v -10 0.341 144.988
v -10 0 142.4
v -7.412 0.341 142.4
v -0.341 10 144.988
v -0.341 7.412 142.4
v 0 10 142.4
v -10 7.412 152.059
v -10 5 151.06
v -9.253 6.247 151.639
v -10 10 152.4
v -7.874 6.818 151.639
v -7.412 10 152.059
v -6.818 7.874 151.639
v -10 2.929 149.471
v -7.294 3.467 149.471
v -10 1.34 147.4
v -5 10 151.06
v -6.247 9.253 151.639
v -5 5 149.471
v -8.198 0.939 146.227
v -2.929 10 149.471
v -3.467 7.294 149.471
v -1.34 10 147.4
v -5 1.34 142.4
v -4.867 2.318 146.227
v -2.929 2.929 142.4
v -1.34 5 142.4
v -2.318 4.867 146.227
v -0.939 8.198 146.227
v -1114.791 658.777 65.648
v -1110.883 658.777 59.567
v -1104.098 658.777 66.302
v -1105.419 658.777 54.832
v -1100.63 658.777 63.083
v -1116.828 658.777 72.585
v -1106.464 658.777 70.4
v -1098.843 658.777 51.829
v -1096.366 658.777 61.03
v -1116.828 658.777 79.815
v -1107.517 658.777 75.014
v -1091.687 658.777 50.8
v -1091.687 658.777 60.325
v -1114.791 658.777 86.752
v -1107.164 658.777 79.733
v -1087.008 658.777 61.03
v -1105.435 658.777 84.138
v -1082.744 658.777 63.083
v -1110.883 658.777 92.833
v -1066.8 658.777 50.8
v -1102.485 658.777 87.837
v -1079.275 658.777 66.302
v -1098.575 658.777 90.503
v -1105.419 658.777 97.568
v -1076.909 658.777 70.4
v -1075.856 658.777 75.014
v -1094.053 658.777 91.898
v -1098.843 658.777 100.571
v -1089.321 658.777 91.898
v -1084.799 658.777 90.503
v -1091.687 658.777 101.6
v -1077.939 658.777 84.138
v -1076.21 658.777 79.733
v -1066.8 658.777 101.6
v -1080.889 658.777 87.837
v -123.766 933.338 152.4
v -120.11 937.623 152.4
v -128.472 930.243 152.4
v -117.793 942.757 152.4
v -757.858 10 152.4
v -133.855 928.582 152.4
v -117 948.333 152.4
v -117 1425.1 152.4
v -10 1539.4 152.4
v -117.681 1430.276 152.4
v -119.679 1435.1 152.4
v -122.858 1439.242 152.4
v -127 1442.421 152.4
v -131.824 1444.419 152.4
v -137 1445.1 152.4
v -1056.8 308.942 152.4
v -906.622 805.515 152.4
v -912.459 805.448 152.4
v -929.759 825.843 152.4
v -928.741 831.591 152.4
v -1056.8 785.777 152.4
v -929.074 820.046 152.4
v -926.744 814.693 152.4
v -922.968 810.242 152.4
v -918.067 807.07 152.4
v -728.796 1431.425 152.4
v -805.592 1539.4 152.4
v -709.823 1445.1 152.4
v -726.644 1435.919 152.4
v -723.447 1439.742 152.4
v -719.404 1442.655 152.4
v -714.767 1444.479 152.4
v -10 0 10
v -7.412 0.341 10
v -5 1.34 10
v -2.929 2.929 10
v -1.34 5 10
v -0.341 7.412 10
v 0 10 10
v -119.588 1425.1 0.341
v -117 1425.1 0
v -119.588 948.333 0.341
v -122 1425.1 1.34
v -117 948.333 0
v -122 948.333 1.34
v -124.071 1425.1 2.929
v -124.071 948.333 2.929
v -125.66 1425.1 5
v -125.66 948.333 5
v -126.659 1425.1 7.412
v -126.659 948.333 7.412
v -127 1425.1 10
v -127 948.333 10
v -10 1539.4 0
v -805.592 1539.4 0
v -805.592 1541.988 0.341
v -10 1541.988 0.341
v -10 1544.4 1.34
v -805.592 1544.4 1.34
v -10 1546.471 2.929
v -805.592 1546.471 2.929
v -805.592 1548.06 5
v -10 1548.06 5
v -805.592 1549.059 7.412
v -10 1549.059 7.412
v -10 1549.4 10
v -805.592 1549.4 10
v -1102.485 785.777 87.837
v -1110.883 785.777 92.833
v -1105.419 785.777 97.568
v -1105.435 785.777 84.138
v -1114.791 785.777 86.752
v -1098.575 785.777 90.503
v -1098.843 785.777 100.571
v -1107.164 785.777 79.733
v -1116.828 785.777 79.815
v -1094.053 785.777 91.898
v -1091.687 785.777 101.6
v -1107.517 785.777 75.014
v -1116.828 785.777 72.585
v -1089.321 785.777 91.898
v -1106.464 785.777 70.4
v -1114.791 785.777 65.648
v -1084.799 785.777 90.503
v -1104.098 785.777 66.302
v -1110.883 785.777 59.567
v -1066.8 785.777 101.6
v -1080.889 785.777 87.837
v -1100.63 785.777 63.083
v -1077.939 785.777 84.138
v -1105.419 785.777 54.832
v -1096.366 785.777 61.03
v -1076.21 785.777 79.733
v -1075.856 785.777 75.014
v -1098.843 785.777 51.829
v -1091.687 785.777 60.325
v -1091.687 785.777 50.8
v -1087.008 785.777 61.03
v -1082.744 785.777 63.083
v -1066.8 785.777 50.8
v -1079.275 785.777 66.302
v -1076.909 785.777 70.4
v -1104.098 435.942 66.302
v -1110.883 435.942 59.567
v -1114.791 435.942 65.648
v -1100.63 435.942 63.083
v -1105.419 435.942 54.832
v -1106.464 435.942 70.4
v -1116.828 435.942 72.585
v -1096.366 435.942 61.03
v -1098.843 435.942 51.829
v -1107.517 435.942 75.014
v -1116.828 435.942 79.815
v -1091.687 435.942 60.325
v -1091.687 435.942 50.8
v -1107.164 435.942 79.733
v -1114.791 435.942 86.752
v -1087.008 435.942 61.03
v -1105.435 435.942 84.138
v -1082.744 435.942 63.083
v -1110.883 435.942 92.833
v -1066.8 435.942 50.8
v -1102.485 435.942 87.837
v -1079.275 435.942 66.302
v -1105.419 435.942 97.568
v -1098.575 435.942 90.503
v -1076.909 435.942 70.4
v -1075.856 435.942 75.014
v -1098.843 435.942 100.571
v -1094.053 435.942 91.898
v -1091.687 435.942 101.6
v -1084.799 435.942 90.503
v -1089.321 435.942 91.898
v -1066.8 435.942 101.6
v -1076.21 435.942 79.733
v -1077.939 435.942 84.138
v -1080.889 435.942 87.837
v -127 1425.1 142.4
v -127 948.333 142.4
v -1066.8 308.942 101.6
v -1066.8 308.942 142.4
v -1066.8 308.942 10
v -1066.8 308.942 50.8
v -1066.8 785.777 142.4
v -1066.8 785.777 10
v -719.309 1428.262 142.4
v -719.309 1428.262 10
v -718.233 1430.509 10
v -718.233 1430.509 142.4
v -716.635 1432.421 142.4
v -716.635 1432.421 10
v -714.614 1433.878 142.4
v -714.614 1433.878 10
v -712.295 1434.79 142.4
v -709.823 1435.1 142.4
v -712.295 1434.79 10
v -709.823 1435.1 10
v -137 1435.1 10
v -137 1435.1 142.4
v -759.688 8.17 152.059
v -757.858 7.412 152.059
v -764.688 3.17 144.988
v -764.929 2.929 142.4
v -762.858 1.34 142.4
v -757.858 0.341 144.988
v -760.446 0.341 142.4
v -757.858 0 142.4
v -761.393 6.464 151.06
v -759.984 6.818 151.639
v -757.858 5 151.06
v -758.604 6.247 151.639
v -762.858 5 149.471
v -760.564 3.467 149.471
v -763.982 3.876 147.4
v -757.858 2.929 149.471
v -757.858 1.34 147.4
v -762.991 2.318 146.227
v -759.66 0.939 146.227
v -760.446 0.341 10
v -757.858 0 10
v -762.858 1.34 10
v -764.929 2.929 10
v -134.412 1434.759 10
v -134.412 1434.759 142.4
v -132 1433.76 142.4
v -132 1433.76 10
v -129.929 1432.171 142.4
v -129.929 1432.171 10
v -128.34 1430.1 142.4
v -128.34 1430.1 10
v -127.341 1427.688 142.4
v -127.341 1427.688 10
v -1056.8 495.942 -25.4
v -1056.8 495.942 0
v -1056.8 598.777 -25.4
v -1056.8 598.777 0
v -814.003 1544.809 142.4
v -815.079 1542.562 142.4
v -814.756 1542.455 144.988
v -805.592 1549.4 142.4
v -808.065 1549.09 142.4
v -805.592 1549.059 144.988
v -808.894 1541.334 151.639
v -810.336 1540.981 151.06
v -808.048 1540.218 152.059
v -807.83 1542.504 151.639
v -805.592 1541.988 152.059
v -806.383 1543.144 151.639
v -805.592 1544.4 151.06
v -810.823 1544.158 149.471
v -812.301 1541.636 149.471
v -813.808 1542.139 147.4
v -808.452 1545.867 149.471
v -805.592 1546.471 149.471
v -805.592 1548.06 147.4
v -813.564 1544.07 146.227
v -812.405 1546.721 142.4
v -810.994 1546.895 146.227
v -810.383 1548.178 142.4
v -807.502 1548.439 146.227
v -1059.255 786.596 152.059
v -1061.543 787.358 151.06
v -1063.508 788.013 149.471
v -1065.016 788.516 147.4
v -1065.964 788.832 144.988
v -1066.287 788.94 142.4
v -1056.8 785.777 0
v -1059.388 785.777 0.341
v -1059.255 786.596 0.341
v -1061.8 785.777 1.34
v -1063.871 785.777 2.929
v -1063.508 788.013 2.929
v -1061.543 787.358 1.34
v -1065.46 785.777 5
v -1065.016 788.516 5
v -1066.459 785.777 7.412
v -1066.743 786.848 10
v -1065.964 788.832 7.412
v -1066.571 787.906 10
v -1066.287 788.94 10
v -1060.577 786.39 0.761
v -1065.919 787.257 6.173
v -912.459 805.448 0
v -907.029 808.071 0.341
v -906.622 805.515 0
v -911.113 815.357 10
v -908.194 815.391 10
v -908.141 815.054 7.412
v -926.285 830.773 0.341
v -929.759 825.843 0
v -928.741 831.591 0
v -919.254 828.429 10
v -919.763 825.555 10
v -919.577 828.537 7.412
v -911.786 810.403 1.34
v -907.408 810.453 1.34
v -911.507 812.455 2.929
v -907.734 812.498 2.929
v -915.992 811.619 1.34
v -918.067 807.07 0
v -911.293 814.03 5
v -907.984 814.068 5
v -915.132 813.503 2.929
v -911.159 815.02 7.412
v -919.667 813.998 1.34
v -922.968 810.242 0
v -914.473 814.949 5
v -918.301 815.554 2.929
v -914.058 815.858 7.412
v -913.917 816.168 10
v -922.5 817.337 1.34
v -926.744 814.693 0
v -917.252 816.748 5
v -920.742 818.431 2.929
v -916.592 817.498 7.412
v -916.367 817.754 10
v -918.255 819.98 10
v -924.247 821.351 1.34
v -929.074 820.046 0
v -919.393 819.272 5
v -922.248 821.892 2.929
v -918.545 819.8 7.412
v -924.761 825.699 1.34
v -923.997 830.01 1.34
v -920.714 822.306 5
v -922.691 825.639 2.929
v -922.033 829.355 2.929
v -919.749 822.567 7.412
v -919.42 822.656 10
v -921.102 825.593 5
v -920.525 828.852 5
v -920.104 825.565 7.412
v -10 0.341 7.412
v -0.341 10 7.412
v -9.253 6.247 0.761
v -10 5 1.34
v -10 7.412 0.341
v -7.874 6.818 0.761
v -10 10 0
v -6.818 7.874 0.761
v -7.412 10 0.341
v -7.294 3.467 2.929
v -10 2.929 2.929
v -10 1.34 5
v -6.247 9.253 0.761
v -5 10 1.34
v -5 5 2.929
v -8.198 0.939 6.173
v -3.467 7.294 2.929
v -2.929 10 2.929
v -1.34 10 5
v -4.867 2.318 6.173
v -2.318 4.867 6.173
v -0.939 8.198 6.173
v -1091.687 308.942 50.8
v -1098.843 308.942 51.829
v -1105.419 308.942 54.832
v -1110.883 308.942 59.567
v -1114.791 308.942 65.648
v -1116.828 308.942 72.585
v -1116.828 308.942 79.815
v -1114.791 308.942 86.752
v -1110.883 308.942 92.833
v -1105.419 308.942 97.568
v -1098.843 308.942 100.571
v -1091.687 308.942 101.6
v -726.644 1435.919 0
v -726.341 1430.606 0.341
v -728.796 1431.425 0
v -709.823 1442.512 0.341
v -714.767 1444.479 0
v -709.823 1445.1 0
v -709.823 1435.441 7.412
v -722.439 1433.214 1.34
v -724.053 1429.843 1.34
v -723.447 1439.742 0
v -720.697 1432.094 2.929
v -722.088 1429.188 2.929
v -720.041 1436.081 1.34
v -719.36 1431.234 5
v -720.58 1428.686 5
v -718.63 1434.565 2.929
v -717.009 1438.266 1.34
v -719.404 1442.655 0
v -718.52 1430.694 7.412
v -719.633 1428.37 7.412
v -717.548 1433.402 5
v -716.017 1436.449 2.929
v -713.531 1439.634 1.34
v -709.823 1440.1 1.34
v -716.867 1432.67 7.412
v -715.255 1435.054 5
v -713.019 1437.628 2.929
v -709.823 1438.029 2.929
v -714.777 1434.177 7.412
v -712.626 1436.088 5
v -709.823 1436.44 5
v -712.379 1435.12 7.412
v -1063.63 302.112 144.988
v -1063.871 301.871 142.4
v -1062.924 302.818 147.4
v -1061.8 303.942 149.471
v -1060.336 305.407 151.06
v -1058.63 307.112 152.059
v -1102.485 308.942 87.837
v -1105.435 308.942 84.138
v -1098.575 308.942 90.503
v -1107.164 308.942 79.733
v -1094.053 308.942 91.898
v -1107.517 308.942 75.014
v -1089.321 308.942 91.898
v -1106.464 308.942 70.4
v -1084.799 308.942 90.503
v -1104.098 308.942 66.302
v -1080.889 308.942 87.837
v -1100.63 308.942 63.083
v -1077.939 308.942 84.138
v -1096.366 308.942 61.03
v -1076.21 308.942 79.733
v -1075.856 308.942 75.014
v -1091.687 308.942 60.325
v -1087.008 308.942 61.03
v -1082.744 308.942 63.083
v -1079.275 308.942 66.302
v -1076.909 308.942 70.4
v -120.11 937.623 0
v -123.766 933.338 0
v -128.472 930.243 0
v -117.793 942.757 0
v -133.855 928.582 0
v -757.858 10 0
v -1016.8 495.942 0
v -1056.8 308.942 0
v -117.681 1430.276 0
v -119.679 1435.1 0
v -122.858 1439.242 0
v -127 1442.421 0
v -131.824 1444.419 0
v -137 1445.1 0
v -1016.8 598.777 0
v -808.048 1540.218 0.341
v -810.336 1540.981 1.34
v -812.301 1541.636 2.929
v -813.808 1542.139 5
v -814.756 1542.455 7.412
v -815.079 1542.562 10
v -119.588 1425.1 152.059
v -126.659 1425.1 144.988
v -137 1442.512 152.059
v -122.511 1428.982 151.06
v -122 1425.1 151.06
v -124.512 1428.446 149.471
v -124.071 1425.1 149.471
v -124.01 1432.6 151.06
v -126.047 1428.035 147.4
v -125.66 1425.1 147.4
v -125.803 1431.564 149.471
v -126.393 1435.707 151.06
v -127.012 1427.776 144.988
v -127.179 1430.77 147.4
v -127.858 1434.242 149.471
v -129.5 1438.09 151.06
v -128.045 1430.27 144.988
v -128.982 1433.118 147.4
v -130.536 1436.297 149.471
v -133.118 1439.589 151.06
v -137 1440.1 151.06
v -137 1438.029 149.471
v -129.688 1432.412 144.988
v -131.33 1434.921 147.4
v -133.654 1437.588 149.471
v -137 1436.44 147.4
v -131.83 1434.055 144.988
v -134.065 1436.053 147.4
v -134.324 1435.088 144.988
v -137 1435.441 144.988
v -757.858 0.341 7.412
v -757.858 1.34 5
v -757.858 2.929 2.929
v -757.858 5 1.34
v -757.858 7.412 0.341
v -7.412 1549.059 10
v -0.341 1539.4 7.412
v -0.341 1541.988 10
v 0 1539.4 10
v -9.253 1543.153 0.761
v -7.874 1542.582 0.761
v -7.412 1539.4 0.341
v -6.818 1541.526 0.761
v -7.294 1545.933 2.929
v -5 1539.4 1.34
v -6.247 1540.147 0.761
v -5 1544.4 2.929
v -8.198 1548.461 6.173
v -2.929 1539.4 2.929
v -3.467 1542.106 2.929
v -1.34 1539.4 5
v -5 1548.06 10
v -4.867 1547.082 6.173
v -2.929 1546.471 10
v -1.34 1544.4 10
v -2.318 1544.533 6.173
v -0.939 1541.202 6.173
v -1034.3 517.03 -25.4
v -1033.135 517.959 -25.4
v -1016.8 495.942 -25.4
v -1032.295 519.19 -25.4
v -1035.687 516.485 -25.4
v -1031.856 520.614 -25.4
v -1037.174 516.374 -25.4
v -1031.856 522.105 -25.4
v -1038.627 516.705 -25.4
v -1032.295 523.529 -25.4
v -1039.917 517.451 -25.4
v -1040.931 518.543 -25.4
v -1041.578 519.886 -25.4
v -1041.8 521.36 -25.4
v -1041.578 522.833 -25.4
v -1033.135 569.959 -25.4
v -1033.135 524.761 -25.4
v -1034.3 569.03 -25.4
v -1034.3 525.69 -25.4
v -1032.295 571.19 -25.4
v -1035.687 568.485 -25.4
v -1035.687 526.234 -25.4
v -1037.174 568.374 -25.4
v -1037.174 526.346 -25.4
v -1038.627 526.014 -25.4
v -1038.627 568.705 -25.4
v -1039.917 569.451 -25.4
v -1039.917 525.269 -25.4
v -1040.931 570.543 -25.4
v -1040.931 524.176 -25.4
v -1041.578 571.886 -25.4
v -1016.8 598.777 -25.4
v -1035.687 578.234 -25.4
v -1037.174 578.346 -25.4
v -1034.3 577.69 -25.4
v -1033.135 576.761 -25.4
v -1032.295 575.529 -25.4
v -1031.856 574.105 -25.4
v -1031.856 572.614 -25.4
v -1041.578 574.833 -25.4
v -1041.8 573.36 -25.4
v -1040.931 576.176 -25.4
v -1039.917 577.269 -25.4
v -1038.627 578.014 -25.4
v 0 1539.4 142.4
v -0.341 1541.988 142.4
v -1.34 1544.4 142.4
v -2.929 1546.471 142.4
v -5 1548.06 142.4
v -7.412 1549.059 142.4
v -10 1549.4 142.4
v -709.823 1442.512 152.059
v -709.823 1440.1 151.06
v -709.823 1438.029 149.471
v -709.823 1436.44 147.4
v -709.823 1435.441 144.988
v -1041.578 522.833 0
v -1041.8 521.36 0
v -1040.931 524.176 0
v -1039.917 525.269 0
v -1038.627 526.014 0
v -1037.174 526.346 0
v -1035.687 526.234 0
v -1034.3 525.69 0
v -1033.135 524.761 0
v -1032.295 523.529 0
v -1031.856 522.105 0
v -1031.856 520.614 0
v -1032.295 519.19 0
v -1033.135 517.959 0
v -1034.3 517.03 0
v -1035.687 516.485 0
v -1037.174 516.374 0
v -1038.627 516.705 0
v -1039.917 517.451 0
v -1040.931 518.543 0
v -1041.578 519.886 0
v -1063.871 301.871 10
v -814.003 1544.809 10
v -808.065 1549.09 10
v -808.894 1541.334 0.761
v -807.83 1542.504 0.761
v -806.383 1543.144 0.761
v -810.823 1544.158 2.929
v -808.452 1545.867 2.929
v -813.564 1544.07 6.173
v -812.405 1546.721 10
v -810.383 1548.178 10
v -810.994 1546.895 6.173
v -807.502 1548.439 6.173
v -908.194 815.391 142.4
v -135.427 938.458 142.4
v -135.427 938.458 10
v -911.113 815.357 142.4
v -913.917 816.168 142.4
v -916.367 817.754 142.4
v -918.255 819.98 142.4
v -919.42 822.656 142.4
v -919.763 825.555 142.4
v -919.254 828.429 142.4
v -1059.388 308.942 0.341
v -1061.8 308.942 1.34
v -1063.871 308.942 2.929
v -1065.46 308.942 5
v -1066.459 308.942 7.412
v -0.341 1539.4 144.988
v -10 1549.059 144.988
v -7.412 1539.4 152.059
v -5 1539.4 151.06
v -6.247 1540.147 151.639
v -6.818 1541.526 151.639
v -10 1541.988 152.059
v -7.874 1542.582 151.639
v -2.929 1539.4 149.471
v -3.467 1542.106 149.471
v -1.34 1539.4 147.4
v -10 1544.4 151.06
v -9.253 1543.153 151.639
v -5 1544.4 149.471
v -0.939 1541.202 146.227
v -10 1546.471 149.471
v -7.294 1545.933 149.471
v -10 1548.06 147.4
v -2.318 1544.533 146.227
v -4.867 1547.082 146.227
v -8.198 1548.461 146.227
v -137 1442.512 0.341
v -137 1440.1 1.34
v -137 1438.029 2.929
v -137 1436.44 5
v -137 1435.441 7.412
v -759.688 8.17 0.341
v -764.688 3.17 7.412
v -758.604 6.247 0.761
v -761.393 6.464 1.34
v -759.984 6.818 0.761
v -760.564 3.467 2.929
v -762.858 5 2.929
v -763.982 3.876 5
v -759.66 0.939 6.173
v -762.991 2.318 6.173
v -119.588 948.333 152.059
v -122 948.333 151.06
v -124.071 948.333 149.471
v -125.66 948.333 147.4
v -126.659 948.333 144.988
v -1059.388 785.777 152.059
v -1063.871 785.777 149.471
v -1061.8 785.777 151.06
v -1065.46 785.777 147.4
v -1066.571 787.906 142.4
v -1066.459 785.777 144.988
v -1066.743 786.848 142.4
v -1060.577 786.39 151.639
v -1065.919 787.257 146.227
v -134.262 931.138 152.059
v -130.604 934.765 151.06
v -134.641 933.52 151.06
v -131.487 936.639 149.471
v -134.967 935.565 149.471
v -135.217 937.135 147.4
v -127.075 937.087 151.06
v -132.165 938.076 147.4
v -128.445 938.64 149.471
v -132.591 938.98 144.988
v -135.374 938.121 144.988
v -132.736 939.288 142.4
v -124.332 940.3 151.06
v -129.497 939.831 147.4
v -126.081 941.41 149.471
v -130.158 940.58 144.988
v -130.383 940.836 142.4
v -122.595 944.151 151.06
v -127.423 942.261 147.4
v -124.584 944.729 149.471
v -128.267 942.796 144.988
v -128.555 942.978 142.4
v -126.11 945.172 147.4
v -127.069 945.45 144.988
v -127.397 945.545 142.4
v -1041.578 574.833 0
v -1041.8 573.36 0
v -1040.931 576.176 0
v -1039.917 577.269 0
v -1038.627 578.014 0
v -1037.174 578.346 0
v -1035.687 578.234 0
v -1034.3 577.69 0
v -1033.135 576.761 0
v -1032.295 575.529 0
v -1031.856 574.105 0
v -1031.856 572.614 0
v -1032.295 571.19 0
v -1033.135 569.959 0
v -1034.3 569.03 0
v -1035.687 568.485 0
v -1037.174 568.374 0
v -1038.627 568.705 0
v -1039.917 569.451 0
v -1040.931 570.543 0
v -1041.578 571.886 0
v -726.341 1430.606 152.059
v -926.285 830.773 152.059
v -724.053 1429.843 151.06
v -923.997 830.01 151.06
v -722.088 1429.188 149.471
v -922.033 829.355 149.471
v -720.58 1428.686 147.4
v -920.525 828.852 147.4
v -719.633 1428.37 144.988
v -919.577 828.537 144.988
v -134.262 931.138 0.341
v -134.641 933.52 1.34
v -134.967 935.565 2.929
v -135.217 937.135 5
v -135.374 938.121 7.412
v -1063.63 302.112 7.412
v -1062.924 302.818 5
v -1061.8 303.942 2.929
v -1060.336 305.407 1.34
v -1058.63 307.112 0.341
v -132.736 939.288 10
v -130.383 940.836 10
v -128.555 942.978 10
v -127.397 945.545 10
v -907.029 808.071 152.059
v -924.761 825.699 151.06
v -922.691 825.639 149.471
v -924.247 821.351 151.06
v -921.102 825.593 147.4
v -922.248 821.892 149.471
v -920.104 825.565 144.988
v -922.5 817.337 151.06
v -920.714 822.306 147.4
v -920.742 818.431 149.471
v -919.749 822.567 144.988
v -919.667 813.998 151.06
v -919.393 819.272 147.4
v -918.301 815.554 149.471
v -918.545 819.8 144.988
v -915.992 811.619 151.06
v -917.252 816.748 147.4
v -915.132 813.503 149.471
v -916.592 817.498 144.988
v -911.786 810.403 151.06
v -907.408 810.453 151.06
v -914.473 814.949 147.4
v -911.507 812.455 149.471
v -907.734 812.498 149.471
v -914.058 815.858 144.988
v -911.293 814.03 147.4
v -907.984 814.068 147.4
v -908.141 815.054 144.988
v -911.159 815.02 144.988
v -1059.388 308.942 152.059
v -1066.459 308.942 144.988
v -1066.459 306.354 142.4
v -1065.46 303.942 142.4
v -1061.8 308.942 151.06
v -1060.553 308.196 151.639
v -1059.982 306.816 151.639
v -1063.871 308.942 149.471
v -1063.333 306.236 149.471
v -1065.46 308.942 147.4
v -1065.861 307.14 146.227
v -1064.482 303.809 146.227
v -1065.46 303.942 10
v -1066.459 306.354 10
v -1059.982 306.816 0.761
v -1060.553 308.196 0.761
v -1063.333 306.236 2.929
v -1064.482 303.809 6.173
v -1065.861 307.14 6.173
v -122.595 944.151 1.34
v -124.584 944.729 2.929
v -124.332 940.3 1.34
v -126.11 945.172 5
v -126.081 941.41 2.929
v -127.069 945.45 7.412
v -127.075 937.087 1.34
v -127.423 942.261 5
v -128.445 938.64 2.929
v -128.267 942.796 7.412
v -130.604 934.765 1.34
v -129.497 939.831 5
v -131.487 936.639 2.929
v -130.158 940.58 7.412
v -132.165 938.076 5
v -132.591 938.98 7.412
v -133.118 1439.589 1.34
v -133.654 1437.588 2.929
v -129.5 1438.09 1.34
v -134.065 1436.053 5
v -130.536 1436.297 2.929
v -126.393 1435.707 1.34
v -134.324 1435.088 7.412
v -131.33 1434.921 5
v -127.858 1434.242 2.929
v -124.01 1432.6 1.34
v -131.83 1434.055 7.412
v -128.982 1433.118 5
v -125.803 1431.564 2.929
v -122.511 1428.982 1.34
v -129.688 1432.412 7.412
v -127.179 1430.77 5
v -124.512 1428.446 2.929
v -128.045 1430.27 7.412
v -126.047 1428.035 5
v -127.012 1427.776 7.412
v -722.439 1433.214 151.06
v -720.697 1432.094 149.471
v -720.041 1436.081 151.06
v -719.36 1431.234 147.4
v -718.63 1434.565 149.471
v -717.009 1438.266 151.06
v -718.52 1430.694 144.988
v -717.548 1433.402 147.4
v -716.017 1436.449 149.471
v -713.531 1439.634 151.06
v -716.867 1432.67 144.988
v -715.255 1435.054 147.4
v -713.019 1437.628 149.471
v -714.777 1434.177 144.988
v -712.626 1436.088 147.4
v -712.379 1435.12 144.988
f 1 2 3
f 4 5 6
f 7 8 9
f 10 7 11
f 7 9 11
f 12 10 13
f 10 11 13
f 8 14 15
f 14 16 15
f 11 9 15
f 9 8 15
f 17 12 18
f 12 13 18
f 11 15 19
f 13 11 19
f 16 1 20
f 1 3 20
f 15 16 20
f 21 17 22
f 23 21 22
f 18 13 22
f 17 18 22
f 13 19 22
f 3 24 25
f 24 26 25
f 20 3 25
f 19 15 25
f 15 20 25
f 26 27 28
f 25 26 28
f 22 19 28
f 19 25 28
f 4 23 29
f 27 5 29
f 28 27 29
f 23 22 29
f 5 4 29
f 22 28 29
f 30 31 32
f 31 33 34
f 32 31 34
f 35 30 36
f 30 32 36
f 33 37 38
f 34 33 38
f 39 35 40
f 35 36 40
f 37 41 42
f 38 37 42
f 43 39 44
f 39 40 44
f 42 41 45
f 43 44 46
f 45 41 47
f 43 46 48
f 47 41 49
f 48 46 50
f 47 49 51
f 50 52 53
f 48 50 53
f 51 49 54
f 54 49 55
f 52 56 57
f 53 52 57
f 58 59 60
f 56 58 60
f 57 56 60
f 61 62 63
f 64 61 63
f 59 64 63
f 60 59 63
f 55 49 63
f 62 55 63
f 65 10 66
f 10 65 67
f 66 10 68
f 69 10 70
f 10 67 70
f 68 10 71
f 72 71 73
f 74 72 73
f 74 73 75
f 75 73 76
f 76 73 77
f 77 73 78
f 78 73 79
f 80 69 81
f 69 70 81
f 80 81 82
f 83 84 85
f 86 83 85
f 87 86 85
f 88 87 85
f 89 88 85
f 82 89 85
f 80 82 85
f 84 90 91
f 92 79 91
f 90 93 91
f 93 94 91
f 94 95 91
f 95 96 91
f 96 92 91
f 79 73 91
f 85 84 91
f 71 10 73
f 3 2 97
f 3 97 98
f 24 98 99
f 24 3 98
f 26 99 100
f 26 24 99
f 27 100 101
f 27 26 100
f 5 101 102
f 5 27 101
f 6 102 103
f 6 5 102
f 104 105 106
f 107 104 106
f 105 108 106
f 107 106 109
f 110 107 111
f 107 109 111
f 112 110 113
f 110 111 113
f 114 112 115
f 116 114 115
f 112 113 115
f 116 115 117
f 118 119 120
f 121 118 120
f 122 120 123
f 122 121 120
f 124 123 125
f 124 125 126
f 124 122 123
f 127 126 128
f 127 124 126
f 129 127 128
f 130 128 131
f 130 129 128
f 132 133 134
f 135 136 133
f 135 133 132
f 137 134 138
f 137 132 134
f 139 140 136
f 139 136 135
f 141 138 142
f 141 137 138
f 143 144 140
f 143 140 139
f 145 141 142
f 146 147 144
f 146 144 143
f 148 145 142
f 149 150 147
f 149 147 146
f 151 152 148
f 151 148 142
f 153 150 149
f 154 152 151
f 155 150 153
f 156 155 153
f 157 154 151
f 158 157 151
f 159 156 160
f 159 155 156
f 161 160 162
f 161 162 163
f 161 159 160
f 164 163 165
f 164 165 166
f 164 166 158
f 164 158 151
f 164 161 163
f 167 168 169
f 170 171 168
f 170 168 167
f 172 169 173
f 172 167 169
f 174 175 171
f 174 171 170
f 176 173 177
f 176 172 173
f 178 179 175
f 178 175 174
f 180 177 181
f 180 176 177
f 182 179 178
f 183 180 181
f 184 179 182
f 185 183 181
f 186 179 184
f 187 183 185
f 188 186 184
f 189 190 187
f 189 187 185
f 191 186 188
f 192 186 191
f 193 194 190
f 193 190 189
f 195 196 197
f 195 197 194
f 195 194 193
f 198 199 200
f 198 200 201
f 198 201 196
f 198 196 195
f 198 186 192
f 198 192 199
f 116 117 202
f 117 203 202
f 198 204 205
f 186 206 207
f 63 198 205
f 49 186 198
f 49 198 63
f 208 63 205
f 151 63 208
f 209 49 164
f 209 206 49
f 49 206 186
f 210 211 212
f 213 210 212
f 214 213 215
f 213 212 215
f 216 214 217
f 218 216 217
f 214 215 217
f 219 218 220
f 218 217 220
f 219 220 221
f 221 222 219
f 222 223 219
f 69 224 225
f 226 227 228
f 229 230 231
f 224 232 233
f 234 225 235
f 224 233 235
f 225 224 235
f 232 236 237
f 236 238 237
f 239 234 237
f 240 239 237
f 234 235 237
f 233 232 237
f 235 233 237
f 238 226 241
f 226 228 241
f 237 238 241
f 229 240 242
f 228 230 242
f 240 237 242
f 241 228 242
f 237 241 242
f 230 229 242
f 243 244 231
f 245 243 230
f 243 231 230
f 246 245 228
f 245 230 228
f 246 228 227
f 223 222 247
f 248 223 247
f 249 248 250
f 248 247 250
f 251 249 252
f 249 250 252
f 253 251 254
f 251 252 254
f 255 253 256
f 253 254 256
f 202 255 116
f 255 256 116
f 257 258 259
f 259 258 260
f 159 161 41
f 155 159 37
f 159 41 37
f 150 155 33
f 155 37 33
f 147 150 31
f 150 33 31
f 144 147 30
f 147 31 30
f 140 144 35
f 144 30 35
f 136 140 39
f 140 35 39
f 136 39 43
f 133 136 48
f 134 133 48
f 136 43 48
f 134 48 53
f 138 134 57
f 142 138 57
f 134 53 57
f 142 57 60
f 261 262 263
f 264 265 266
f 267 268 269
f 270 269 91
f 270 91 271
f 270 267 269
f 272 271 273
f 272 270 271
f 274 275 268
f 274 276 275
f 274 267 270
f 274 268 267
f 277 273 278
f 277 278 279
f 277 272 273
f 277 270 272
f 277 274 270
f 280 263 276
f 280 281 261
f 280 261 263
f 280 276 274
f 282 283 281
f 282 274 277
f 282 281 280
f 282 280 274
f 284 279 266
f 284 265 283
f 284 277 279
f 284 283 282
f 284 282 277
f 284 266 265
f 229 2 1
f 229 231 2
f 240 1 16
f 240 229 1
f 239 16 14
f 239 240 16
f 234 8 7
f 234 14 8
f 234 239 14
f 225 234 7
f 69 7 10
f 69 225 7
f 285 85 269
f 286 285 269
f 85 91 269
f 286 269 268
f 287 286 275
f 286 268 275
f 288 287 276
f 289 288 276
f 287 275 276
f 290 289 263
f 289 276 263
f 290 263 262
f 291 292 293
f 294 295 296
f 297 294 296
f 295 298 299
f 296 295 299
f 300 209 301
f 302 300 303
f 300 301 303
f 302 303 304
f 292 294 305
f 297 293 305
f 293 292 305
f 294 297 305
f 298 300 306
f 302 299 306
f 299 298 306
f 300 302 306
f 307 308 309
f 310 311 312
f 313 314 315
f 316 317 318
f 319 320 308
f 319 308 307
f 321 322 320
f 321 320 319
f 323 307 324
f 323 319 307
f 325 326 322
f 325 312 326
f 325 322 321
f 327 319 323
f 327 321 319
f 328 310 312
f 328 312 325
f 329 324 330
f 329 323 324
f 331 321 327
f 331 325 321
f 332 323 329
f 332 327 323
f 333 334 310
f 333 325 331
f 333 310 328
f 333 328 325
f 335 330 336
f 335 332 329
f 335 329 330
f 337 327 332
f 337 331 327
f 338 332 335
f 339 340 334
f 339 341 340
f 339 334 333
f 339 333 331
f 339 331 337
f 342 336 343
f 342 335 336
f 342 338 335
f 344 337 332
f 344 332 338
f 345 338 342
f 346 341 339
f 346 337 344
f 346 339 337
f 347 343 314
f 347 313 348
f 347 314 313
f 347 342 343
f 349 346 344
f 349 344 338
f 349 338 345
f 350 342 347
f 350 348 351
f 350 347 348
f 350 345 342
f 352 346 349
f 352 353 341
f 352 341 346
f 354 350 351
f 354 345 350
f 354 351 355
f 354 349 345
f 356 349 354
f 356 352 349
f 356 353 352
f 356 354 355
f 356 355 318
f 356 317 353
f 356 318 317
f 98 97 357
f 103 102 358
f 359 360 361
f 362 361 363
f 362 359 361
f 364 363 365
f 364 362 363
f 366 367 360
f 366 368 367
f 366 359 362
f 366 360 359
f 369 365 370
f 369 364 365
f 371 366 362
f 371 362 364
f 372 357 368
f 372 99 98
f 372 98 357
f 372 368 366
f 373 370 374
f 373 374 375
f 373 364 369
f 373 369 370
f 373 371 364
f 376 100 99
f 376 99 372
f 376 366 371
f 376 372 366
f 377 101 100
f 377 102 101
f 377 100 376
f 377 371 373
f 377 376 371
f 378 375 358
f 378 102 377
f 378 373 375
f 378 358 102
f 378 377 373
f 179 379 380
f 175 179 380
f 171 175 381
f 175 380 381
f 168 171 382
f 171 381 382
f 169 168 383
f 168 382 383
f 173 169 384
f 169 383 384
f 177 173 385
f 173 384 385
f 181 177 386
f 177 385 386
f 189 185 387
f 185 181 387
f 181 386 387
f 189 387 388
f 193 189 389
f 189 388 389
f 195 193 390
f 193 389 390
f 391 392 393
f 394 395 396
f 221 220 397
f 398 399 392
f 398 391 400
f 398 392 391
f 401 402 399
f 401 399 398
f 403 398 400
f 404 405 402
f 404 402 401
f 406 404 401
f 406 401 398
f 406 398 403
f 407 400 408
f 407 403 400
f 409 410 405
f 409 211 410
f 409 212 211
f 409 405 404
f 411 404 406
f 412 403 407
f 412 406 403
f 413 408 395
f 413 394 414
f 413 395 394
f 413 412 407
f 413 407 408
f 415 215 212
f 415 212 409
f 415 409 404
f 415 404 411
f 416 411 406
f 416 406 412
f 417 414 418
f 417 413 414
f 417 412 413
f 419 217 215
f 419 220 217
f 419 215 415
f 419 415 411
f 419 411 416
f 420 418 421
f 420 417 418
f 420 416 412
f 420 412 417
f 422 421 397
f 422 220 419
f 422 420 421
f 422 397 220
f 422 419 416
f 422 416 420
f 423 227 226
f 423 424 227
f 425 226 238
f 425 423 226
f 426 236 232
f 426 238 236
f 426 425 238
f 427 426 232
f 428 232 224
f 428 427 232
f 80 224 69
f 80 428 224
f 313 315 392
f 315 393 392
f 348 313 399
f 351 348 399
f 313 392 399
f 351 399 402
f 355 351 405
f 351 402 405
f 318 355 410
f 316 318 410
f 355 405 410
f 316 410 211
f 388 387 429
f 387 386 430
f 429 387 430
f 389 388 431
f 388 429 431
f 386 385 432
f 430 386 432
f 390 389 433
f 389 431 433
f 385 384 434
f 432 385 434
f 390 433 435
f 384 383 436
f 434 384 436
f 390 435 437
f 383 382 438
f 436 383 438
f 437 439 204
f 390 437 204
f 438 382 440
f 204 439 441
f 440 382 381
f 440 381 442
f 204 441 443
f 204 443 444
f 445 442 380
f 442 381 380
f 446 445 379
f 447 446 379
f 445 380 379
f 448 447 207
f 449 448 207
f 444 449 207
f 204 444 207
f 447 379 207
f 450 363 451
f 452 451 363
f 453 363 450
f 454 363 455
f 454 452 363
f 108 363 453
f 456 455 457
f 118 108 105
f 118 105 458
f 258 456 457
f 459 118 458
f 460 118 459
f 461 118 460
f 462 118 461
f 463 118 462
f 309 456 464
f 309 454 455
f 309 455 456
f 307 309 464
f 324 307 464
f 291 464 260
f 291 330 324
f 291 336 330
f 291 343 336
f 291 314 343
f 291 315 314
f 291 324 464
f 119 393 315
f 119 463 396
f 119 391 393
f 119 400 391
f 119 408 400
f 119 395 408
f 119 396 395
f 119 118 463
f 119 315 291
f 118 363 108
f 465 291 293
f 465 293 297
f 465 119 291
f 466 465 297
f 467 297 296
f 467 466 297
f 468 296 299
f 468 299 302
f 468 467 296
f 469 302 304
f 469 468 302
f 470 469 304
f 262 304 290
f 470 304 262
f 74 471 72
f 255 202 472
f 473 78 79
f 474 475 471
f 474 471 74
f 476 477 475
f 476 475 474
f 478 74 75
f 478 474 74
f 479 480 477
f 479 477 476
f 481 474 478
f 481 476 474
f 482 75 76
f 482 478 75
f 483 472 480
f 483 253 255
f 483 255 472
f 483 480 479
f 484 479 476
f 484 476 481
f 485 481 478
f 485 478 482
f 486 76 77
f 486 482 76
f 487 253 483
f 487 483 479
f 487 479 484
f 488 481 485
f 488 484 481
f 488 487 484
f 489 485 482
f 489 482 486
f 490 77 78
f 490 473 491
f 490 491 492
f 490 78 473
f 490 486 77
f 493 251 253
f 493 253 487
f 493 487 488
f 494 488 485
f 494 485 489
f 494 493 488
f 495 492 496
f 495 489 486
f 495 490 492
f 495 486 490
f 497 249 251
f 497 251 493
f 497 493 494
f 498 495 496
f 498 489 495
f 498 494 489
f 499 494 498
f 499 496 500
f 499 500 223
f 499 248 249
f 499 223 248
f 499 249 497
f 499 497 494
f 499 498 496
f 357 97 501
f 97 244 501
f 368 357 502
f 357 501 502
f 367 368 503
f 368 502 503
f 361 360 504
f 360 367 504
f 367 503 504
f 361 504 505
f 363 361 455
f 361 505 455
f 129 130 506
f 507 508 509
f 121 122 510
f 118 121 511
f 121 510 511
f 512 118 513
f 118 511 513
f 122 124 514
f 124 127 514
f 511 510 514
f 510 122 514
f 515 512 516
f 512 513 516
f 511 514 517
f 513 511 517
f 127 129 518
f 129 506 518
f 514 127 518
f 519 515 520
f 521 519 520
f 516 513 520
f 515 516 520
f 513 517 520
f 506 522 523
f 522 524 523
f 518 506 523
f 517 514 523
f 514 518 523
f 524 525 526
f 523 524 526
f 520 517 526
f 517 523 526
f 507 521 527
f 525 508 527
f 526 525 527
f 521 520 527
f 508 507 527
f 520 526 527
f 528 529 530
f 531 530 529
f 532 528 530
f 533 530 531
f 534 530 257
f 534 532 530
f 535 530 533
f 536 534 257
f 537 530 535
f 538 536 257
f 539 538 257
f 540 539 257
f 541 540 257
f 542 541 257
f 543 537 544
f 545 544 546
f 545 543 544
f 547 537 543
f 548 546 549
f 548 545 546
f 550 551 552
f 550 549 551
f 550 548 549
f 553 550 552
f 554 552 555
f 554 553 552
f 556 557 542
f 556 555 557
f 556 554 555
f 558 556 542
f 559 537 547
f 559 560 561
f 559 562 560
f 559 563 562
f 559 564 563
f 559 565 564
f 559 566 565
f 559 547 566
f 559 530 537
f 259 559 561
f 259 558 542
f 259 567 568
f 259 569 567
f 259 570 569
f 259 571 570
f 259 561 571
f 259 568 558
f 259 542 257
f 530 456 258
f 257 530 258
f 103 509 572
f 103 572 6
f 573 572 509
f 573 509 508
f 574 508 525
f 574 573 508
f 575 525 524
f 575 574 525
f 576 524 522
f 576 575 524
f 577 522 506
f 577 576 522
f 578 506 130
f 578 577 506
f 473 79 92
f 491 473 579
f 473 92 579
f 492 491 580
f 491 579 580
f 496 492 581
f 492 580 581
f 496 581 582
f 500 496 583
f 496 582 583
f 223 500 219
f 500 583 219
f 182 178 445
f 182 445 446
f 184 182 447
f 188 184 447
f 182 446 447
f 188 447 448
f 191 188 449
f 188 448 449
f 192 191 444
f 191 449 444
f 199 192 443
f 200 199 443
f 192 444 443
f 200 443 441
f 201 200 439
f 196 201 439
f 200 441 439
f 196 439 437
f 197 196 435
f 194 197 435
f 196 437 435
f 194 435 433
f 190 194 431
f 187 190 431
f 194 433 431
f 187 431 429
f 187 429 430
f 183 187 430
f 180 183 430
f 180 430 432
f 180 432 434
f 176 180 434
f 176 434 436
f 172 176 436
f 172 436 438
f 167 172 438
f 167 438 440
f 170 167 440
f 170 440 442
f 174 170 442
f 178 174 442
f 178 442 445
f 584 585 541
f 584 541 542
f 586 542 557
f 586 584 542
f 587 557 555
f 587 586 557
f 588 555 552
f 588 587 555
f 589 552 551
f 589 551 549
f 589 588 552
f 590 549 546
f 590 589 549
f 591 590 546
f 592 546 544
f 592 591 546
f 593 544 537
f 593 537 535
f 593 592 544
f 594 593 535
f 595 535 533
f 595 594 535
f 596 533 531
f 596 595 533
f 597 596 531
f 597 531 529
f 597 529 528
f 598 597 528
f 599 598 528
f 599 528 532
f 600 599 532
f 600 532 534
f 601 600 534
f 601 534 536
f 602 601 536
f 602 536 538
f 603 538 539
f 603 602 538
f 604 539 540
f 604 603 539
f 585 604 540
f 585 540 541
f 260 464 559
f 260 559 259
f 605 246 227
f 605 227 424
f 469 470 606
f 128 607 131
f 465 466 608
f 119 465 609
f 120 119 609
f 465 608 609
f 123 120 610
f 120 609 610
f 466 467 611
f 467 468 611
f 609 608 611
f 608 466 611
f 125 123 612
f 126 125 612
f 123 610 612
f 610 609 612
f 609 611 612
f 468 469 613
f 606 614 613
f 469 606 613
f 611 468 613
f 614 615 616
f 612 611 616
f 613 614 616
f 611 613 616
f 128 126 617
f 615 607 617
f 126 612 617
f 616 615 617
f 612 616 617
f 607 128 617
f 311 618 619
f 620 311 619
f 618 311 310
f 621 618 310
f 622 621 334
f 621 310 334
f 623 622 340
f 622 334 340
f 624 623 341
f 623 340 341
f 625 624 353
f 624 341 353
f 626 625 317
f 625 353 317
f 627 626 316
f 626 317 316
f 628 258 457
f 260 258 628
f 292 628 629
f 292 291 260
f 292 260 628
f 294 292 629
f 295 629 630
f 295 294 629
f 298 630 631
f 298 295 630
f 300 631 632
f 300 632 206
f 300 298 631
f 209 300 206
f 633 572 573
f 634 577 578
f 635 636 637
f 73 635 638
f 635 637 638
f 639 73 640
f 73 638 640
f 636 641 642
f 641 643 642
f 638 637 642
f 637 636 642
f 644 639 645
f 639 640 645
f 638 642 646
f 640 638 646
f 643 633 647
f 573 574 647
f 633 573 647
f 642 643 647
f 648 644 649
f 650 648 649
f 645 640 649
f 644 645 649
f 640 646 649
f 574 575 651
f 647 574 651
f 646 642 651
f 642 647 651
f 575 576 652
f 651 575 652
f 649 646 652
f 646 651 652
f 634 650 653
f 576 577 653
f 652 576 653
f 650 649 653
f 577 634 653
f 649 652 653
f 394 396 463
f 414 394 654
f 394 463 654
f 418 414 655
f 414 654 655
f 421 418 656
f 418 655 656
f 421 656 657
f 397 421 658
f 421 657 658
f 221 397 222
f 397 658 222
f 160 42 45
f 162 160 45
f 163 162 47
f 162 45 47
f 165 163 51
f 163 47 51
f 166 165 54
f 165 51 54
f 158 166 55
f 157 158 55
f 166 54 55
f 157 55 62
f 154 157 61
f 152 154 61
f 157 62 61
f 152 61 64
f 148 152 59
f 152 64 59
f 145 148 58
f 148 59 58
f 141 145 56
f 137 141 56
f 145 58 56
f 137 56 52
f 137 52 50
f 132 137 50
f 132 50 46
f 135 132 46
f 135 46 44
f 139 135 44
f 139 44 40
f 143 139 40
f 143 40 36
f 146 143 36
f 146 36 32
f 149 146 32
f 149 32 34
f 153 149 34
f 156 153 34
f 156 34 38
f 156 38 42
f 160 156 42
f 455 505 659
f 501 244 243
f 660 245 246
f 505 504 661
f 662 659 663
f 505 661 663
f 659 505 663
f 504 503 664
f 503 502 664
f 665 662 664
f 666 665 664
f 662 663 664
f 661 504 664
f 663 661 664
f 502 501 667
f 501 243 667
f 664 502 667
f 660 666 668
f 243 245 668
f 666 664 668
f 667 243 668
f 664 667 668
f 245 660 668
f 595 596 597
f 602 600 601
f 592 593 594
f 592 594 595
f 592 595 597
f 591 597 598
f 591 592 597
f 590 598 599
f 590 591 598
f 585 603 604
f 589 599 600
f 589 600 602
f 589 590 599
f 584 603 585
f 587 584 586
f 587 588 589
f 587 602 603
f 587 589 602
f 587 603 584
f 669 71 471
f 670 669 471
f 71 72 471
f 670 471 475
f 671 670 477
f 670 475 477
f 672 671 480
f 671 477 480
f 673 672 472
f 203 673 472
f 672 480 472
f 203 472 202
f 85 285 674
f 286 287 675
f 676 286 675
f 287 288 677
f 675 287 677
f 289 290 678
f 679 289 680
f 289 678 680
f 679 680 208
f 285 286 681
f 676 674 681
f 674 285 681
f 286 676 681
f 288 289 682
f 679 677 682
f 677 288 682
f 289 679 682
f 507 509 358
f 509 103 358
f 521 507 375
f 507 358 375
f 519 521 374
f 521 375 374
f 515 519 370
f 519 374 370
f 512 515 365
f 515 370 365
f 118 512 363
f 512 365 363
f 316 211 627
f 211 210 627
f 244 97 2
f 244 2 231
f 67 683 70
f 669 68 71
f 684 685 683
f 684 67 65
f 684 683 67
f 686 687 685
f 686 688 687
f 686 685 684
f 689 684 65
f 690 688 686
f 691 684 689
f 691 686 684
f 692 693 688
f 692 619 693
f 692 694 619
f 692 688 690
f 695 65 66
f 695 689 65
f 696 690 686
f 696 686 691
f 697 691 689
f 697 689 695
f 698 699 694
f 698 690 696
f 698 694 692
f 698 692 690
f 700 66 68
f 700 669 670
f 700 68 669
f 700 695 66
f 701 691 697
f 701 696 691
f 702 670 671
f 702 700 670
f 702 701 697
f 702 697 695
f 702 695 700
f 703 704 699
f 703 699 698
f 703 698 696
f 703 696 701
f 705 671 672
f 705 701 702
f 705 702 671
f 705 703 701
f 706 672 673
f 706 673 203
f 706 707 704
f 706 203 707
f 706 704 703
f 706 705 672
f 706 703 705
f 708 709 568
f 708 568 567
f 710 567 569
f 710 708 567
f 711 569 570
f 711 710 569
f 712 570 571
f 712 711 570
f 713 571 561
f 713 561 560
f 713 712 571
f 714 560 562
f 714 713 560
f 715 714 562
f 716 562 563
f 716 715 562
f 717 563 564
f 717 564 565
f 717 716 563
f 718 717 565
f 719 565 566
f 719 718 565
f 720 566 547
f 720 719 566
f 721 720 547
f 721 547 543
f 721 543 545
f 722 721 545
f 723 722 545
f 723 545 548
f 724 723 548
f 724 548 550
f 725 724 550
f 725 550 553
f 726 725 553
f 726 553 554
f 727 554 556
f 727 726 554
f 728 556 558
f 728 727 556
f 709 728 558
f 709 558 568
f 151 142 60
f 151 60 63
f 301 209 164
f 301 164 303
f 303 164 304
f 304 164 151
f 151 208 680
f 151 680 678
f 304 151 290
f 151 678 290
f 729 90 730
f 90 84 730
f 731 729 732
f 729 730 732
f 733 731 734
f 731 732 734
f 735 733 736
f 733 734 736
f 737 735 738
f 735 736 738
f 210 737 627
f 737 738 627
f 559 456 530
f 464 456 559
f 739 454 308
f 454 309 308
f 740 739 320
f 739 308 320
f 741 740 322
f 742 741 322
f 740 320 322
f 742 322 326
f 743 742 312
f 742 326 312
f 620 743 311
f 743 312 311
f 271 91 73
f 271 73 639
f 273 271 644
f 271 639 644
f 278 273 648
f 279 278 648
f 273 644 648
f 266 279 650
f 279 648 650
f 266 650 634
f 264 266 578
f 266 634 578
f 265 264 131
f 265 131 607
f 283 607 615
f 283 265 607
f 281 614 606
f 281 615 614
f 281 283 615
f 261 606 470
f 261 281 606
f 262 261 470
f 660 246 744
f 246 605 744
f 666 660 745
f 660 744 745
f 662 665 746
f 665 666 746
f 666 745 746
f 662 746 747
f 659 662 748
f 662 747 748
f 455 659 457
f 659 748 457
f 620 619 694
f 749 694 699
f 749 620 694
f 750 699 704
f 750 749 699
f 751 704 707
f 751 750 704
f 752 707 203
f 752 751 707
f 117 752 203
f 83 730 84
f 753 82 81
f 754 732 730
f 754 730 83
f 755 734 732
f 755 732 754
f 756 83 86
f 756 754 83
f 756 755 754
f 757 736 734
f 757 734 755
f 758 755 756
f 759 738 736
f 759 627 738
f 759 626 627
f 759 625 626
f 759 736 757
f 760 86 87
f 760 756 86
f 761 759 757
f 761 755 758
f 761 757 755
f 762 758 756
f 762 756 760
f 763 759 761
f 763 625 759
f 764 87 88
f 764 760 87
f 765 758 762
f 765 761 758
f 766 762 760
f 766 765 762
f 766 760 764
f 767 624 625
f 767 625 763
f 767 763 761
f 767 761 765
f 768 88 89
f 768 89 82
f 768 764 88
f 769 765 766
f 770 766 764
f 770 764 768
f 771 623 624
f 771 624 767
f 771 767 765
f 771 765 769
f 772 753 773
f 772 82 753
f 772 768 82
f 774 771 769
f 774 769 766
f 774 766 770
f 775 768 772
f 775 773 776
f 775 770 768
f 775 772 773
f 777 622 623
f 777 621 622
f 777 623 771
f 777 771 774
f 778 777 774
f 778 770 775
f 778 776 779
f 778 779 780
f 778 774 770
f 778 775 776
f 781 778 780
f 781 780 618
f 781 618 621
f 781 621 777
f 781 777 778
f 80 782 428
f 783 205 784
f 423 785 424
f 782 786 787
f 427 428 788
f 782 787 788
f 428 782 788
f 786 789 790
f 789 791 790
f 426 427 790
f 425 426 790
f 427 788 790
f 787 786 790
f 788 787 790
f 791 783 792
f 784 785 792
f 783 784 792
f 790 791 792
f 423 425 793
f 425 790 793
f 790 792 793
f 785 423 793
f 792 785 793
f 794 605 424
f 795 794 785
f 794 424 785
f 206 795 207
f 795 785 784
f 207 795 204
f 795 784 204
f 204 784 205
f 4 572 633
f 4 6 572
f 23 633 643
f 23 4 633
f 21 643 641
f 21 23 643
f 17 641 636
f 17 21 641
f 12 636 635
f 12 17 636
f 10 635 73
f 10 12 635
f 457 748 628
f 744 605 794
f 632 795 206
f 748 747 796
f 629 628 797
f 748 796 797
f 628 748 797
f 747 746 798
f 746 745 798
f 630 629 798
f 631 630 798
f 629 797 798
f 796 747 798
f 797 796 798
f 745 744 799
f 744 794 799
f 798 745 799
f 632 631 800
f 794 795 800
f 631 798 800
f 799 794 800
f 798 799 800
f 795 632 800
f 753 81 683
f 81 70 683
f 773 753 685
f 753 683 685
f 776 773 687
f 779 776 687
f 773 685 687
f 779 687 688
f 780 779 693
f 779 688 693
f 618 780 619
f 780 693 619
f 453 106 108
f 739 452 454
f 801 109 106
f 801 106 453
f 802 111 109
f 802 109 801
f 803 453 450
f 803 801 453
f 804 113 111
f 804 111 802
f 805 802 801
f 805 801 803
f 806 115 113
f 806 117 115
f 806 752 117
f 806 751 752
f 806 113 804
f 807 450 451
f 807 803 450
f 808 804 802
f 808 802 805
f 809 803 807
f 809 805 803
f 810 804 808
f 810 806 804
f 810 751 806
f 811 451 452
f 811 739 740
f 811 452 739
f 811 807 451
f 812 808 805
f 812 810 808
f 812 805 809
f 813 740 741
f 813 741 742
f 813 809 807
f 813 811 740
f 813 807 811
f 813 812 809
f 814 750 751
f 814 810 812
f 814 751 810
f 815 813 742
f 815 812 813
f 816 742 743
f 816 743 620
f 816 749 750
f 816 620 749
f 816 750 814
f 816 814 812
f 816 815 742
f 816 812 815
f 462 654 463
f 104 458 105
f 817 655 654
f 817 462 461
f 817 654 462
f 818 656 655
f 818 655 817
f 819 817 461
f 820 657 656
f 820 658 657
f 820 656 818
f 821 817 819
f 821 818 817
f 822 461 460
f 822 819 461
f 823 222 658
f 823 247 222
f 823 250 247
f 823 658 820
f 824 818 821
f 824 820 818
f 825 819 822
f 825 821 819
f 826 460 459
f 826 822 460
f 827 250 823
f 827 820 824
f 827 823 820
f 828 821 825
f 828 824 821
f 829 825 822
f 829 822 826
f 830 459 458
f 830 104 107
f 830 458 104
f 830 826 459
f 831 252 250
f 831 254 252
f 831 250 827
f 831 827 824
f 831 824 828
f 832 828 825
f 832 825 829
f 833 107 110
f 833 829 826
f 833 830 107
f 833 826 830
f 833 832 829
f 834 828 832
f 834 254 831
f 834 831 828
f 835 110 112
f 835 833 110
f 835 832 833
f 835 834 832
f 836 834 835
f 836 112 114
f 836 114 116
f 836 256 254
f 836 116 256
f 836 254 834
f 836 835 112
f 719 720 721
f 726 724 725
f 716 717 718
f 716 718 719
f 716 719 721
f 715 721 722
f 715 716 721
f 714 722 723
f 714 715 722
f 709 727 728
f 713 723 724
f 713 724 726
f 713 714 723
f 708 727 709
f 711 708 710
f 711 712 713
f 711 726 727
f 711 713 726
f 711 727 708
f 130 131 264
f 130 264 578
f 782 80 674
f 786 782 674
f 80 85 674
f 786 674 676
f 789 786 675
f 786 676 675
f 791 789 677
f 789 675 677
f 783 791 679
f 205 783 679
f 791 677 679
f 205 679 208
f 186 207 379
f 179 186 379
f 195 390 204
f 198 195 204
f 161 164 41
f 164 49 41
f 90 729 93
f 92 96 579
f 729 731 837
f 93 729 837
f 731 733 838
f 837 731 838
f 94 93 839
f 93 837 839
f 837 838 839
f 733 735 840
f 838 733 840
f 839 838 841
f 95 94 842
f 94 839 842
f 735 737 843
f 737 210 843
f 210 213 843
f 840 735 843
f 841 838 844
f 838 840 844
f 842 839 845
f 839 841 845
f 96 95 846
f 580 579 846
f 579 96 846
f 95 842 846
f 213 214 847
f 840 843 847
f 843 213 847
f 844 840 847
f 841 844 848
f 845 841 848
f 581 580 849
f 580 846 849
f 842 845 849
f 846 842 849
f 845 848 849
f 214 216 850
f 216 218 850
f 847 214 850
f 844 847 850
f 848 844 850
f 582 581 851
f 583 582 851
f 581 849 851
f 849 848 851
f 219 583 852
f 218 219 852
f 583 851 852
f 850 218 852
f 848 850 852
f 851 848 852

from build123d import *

# Parameters (mm, degrees)
BOSS_EXTRUDE1_DEPTH = 152.4
CUT_EXTRUDE1_DEPTH  = 1888.307171607
FILLET1_R           = 10
BOSS_EXTRUDE2_DEPTH = 476.835088
CUT_EXTRUDE2_REACH  = 1889.307
SKETCH4_W           = 50.8
SKETCH4_H           = 222.835087774
SKETCH6_R           = 15.875
CUT_EXTRUDE3_DEPTH  = 1677.259068793
SKETCH7_W           = 40
SKETCH7_H           = 102.835087774
SKETCH7_R           = 5
BOSS_EXTRUDE3_DEPTH = 25.4


with BuildPart() as part:
    # Sketch1 → Boss-Extrude1 (new body)
    with BuildSketch(Plane.XY):
        Polygon((0, 0), (-762, 0), (-1066.8, 304.8), (-1066.8, 787.4), (-812.8, 1549.4), (0, 1549.4), align=None)
    extrude(amount=BOSS_EXTRUDE1_DEPTH)

    # Sketch2 → Cut-Extrude1 (cut, through all)
    with BuildSketch(Plane.XY.offset(152.4)):
        Polygon((-924.463579053, 812.8), (-127, 939.8), (-127, 1435.1), (-717.03024572, 1435.1), align=None)
    extrude(amount=-CUT_EXTRUDE1_DEPTH, mode=Mode.SUBTRACT)

    # Fillet1
    fillet1_edges = [part.edges().sort_by_distance(p)[0] for p in [
        (0, 0, 76.2),
        (-762, 0, 76.2),
        (-1066.8, 304.8, 76.2),
        (-1066.8, 787.4, 76.2),
        (-812.8, 1549.4, 76.2),
        (0, 1549.4, 76.2),
        (-939.8, 1168.4, 152.4),
        (-1066.8, 546.1, 152.4),
        (-914.4, 152.4, 152.4),
        (-820.746912386, 1123.95, 0),
        (-924.463579053, 812.8, 76.2),
        (-422.01512286, 1435.1, 0),
        (-717.03024572, 1435.1, 76.2),
        (-127, 1187.45, 0),
        (-381, 0, 152.4),
        (-127, 1435.1, 76.2),
        (-525.731789526, 876.3, 0),
        (-127, 939.8, 76.2),
        (-820.746912386, 1123.95, 152.4),
        (-525.731789526, 876.3, 152.4),
        (-127, 1187.45, 152.4),
        (-422.01512286, 1435.1, 152.4),
        (0, 774.7, 152.4),
        (-381, 0, 0),
        (-914.4, 152.4, 0),
        (-1066.8, 546.1, 0),
        (-939.8, 1168.4, 0),
        (-406.4, 1549.4, 0),
        (0, 774.7, 0),
        (-406.4, 1549.4, 152.4),
    ]]
    fillet(fillet1_edges, radius=FILLET1_R)

    # Sketch3 → Boss-Extrude2 (add)
    with BuildSketch(Plane(origin=(0, 308.942135624, 0), x_dir=(-1, 0, 0), z_dir=(0, -1, 0))):
        with BuildLine():
            Line((1066.286832981, -76.2), (1066.286832981, -50.8))
            Line((1066.286832981, -50.8), (1091.686832981, -50.8))
            ThreePointArc((1091.686832981, -50.8), (1117.086832981, -76.2), (1091.686832981, -101.6))
            Line((1091.686832981, -101.6), (1066.286832981, -101.6))
            Line((1066.286832981, -101.6), (1066.286832981, -76.2))
        make_face()
    extrude(amount=-BOSS_EXTRUDE2_DEPTH)

    # Sketch4 → Cut-Extrude2 (cut, up to next)
    with BuildSketch(Plane.ZY.offset(1066.8), mode=Mode.PRIVATE) as cut_extrude2_sk1:
        with Locations((76.2, 547.359679511)):
            Rectangle(SKETCH4_W, SKETCH4_H)
    cut_extrude2_tool1 = extrude(cut_extrude2_sk1.sketch, amount=CUT_EXTRUDE2_REACH, mode=Mode.PRIVATE) & part.part
    add(cut_extrude2_tool1.solids().sort_by_distance((-1066.8, 547.35968, 76.2))[0], mode=Mode.SUBTRACT)

    # Sketch6 → Cut-Extrude3 (cut, through all)
    with BuildSketch(Plane(origin=(0, 308.942135624, 0), x_dir=(-1, 0, 0), z_dir=(0, -1, 0))):
        with Locations(Location((1091.686832981, -76.2, 0), (0, 0, 90))):
            Circle(SKETCH6_R)
    extrude(amount=-CUT_EXTRUDE3_DEPTH, mode=Mode.SUBTRACT)

    # Sketch7 → Boss-Extrude3 (add)
    with BuildSketch(Plane(origin=(0, 0, 0), x_dir=(-1, 0, 0), z_dir=(0, 0, -1))):
        with Locations((1036.8, 547.359679511)):
            Rectangle(SKETCH7_W, SKETCH7_H)
        with Locations((1036.8, 573.359679511)):
            Circle(SKETCH7_R, mode=Mode.SUBTRACT)
        with Locations((1036.8, 521.359679511)):
            Circle(SKETCH7_R, mode=Mode.SUBTRACT)
    extrude(amount=BOSS_EXTRUDE3_DEPTH)


solid = part.part
